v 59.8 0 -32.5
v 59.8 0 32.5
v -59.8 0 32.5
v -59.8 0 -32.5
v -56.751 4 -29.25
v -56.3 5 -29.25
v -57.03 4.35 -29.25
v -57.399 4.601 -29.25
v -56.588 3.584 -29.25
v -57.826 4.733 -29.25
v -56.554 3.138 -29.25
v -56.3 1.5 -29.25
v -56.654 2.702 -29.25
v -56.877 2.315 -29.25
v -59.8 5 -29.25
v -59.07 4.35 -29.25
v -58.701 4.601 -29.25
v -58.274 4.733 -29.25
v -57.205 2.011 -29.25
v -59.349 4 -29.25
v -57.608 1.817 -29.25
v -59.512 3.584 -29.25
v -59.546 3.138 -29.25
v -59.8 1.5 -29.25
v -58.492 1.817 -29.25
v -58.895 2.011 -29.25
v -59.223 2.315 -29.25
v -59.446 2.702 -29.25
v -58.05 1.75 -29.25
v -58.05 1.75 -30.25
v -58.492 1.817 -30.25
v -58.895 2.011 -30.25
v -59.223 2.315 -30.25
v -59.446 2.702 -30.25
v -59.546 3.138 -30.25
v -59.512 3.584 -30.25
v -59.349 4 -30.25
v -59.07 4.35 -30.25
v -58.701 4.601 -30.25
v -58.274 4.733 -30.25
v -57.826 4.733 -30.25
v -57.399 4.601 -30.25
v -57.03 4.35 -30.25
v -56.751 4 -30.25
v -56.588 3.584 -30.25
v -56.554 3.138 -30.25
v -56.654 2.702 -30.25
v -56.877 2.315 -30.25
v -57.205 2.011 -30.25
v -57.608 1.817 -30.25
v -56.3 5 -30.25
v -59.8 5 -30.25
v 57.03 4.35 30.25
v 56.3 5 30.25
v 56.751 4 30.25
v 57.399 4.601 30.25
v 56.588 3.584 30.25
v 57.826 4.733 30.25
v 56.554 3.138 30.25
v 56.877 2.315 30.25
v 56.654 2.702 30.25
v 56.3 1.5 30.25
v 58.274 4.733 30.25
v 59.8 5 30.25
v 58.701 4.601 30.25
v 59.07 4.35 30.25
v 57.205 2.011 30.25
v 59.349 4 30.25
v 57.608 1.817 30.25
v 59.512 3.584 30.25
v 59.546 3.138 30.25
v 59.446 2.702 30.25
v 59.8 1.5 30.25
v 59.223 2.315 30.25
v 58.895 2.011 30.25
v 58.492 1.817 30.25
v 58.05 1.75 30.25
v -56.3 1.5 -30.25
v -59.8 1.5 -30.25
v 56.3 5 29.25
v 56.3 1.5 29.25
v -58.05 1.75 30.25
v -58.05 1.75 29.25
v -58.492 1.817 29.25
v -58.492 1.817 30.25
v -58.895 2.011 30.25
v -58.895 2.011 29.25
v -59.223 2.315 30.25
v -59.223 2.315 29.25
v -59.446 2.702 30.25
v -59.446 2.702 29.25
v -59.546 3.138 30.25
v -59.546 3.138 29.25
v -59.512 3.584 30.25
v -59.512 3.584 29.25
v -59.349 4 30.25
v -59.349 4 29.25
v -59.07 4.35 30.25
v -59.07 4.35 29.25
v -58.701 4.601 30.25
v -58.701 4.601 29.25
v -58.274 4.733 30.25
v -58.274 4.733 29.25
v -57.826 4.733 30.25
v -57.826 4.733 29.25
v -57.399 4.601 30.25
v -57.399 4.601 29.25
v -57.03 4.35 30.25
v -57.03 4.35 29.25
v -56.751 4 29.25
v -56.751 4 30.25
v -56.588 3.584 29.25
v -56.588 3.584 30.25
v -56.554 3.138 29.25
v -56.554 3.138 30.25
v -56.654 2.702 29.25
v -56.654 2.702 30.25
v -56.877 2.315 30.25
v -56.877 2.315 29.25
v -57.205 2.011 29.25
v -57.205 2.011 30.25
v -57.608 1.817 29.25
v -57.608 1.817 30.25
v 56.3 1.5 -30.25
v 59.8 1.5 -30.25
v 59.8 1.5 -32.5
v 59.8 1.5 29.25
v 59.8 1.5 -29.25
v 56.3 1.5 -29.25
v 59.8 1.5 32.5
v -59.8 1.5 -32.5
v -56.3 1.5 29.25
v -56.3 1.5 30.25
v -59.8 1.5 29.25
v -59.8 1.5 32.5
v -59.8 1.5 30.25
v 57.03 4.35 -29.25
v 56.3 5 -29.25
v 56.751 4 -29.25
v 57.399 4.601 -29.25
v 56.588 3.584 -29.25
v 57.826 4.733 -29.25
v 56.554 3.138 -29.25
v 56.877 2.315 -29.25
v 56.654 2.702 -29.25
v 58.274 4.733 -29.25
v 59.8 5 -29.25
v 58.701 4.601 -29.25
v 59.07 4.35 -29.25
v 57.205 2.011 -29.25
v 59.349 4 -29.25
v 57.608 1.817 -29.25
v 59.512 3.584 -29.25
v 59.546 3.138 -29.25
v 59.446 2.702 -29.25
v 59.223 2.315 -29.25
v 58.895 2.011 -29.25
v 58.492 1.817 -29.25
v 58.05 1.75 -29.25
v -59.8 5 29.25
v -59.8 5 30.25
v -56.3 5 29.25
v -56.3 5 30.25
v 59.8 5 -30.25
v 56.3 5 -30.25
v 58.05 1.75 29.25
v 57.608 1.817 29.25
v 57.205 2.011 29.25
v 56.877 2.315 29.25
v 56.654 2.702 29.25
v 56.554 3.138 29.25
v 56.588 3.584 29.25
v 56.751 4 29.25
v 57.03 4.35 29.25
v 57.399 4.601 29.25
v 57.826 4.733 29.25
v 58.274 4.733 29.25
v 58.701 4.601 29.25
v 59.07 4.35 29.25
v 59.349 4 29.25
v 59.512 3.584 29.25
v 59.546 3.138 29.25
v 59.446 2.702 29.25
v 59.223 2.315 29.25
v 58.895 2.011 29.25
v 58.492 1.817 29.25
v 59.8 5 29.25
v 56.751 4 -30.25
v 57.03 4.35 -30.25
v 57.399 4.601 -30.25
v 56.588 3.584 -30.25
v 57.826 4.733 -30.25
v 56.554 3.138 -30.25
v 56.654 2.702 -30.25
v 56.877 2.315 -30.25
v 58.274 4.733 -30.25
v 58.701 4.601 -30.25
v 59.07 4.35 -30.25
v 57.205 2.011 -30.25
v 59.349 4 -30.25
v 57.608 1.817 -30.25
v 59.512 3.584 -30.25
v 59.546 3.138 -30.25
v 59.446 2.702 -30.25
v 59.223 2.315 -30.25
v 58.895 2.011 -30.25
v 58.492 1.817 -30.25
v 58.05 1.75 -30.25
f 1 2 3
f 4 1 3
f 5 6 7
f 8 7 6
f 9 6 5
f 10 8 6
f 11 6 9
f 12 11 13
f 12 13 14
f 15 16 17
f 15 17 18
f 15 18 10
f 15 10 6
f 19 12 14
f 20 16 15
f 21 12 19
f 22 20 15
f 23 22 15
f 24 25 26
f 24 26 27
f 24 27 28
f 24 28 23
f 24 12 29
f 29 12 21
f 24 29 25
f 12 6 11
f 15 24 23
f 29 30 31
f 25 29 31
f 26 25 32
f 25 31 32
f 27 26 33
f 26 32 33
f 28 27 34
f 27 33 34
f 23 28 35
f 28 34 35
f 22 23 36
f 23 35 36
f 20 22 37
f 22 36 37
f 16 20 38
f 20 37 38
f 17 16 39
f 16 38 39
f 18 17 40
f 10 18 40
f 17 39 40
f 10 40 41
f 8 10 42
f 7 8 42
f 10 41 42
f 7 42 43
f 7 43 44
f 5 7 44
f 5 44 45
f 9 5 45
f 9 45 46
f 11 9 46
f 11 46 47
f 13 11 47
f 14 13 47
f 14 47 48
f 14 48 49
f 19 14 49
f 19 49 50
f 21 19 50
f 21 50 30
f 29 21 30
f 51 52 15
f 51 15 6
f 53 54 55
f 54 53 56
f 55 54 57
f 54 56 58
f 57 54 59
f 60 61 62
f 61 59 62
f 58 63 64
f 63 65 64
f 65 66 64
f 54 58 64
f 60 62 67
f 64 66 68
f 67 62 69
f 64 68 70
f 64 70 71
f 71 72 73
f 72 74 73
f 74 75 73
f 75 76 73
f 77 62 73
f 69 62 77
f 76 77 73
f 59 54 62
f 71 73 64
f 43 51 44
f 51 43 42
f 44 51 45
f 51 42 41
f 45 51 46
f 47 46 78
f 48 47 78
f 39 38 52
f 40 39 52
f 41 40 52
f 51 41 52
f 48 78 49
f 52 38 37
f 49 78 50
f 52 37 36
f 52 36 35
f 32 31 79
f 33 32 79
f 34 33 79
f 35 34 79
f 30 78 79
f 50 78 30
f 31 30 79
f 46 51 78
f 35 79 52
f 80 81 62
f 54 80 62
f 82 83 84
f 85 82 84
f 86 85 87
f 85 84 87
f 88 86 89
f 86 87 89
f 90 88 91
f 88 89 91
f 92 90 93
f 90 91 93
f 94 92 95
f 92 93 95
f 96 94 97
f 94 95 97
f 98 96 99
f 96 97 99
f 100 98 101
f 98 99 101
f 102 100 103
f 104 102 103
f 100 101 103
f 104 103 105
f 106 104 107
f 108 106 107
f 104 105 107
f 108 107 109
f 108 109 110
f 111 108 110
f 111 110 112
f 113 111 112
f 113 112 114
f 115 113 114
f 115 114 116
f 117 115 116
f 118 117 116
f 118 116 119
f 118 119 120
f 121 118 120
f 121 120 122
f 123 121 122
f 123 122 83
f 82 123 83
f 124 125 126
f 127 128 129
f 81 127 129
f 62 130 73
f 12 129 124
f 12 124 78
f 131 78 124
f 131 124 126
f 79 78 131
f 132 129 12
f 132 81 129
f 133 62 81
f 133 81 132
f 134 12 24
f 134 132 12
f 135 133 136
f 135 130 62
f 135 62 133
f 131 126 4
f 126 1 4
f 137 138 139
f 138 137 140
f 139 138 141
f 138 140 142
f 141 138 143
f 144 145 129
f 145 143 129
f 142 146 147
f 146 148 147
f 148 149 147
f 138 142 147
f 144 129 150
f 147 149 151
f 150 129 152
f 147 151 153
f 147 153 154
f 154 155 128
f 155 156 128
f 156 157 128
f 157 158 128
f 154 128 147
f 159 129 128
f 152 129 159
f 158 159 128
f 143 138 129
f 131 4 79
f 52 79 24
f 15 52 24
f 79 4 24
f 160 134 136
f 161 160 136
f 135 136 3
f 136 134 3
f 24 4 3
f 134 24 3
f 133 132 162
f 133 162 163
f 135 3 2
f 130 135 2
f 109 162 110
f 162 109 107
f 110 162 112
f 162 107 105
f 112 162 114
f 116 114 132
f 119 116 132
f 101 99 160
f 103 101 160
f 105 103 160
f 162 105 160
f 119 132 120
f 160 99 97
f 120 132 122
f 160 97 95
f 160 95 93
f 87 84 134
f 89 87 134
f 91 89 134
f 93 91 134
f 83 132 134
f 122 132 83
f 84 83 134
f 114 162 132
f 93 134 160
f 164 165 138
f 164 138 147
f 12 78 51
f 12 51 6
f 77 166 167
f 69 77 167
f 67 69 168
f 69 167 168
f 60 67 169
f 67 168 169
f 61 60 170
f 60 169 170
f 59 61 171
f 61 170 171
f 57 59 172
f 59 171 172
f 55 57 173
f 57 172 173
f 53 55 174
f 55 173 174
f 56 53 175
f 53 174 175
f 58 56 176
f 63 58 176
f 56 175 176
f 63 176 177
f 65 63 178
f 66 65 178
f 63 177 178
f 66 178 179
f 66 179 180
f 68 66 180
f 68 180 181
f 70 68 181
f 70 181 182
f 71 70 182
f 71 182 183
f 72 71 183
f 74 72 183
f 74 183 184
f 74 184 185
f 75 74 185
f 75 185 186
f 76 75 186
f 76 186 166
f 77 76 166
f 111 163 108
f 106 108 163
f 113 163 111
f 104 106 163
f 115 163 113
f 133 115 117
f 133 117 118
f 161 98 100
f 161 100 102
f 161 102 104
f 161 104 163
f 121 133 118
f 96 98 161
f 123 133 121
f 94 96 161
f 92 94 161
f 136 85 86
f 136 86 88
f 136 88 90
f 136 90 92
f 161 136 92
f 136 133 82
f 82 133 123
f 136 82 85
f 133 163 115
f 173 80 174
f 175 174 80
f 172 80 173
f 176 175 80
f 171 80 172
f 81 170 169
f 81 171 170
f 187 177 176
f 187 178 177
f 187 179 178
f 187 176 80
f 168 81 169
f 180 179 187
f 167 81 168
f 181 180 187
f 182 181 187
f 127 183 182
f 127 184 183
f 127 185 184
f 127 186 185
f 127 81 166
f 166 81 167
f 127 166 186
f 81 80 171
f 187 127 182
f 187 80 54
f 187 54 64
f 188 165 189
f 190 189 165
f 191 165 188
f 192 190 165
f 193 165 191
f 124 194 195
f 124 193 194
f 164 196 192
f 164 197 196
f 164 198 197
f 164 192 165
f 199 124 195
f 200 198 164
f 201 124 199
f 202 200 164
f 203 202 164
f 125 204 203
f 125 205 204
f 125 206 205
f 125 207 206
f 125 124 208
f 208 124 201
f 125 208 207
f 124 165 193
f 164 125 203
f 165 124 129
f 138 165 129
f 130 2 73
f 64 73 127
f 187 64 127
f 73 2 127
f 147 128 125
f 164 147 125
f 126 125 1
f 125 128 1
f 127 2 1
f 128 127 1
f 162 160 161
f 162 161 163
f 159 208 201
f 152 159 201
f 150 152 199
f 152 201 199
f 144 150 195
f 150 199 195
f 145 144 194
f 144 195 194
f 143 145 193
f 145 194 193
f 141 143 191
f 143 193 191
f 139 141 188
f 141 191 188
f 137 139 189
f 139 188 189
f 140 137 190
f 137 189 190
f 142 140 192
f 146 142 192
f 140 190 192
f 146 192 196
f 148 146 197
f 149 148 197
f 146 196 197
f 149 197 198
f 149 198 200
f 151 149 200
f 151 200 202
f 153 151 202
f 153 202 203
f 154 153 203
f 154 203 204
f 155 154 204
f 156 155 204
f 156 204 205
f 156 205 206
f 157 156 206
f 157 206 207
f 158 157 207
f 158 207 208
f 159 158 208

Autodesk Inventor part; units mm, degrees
ref_plane "YZ Plane" through (0, 0, 0) normal (1, 0, 0) x (0, 1, 0)
ref_plane "XZ Plane" through (0, 0, 0) normal (0, 1, 0) x (-1, 0, 0)
ref_plane "XY Plane" through (0, 0, 0) normal (0, 0, 1) x (1, 0, 0)
sketch "Sketch1" plane through (0, 0, 0) normal (0, 1, 0) x (-1, 0, 0)
  line L0 (59.8, 32.5) -> (-59.8, 32.5)
  line L1 (-59.8, 32.5) -> (-59.8, -32.5)
  line L2 (-59.8, -32.5) -> (59.8, -32.5)
  line L3 (59.8, -32.5) -> (59.8, 32.5)
  line L4 (59.8, 32.5) -> (-59.8, -32.5) construction
  line L5 (-59.8, 32.5) -> (59.8, -32.5) construction
  point P0 (0, 0)
  dimension "d0" = 119.6
  dimension "d1" = 65
extrude "Extrusion1" add sketch "Sketch1" along normal blind 1.5
sketch "Sketch2" plane through (0, 1.5, 0) normal (0, 1, 0) x (1, 0, 0)
  line L0 (59.8, -32.5) -> (59.8, 32.5) projected
  line L1 (-59.8, -29.75) -> (59.8, -29.75)
  line L2 (59.8, -29.75) -> (59.8, 29.75)
  line L3 (59.8, 29.75) -> (-59.8, 29.75)
  line L4 (-59.8, 29.75) -> (-59.8, -29.75)
  line L5 (-59.8, -29.75) -> (59.8, 29.75) construction
  line L6 (59.8, -29.75) -> (-59.8, 29.75) construction
  line L7 (59.8, 29.75) -> (56.3, 29.75)
  line L8 (56.3, 29.75) -> (56.3, 30.25)
  line L9 (56.3, 30.25) -> (59.8, 30.25)
  line L10 (59.8, 30.25) -> (59.8, 29.75)
  line L11 (56.3, 29.75) -> (56.3, 29.25)
  line L12 (56.3, 29.25) -> (59.8, 29.25)
  line L13 (59.8, 29.25) -> (59.8, 29.75)
  line L14 (0, 0) -> (0, 29.75)
  line L15 (0, 0) -> (37, 0)
  line L16 (-59.8, 29.75) -> (-56.3, 29.75)
  line L17 (-56.3, 29.75) -> (-56.3, 30.25)
  line L18 (-56.3, 30.25) -> (-59.8, 30.25)
  line L19 (-59.8, 30.25) -> (-59.8, 29.75)
  line L20 (-56.3, 29.75) -> (-56.3, 29.25)
  line L21 (-56.3, 29.25) -> (-59.8, 29.25)
  line L22 (-59.8, 29.25) -> (-59.8, 29.75)
  line L23 (59.8, -29.75) -> (56.3, -29.75)
  line L24 (56.3, -29.75) -> (56.3, -30.25)
  line L25 (56.3, -30.25) -> (59.8, -30.25)
  line L26 (59.8, -30.25) -> (59.8, -29.75)
  line L27 (56.3, -29.75) -> (56.3, -29.25)
  line L28 (56.3, -29.25) -> (59.8, -29.25)
  line L29 (59.8, -29.25) -> (59.8, -29.75)
  line L30 (-59.8, -29.75) -> (-56.3, -29.75)
  line L31 (-56.3, -29.75) -> (-56.3, -30.25)
  line L32 (-59.8, -30.25) -> (-59.8, -29.75)
  line L33 (-56.3, -29.75) -> (-56.3, -29.25)
  line L34 (-56.3, -29.25) -> (-59.8, -29.25)
  line L35 (-59.8, -29.25) -> (-59.8, -29.75)
  line L36 (-56.3, -30.25) -> (-59.8, -30.25)
  dimension "d4" = 59.5
  dimension "d5" = 3.5
  dimension "d6" = 0.5
extrude "Extrusion2" add sketch "Sketch2" along normal blind 3.5 contours L25 L24 L1 L0 | L1 L27 L28 L0 | L12 L11 L3 L0 | L31 L36 L32 L1 | L1 L4 L34 L33 | L3 L8 L9 L0 | L4 L3 L20 L21 | L3 L19 L18 L17
hole "Hole1" at (-58.05, 3.25, 30.25) direction (0, 0, -1) diameter 3 end through all
hole "Hole2" at (58.05, 3.25, 30.25) direction (0, 0, -1) diameter 3 end through all
properties part number "Bumper big"
